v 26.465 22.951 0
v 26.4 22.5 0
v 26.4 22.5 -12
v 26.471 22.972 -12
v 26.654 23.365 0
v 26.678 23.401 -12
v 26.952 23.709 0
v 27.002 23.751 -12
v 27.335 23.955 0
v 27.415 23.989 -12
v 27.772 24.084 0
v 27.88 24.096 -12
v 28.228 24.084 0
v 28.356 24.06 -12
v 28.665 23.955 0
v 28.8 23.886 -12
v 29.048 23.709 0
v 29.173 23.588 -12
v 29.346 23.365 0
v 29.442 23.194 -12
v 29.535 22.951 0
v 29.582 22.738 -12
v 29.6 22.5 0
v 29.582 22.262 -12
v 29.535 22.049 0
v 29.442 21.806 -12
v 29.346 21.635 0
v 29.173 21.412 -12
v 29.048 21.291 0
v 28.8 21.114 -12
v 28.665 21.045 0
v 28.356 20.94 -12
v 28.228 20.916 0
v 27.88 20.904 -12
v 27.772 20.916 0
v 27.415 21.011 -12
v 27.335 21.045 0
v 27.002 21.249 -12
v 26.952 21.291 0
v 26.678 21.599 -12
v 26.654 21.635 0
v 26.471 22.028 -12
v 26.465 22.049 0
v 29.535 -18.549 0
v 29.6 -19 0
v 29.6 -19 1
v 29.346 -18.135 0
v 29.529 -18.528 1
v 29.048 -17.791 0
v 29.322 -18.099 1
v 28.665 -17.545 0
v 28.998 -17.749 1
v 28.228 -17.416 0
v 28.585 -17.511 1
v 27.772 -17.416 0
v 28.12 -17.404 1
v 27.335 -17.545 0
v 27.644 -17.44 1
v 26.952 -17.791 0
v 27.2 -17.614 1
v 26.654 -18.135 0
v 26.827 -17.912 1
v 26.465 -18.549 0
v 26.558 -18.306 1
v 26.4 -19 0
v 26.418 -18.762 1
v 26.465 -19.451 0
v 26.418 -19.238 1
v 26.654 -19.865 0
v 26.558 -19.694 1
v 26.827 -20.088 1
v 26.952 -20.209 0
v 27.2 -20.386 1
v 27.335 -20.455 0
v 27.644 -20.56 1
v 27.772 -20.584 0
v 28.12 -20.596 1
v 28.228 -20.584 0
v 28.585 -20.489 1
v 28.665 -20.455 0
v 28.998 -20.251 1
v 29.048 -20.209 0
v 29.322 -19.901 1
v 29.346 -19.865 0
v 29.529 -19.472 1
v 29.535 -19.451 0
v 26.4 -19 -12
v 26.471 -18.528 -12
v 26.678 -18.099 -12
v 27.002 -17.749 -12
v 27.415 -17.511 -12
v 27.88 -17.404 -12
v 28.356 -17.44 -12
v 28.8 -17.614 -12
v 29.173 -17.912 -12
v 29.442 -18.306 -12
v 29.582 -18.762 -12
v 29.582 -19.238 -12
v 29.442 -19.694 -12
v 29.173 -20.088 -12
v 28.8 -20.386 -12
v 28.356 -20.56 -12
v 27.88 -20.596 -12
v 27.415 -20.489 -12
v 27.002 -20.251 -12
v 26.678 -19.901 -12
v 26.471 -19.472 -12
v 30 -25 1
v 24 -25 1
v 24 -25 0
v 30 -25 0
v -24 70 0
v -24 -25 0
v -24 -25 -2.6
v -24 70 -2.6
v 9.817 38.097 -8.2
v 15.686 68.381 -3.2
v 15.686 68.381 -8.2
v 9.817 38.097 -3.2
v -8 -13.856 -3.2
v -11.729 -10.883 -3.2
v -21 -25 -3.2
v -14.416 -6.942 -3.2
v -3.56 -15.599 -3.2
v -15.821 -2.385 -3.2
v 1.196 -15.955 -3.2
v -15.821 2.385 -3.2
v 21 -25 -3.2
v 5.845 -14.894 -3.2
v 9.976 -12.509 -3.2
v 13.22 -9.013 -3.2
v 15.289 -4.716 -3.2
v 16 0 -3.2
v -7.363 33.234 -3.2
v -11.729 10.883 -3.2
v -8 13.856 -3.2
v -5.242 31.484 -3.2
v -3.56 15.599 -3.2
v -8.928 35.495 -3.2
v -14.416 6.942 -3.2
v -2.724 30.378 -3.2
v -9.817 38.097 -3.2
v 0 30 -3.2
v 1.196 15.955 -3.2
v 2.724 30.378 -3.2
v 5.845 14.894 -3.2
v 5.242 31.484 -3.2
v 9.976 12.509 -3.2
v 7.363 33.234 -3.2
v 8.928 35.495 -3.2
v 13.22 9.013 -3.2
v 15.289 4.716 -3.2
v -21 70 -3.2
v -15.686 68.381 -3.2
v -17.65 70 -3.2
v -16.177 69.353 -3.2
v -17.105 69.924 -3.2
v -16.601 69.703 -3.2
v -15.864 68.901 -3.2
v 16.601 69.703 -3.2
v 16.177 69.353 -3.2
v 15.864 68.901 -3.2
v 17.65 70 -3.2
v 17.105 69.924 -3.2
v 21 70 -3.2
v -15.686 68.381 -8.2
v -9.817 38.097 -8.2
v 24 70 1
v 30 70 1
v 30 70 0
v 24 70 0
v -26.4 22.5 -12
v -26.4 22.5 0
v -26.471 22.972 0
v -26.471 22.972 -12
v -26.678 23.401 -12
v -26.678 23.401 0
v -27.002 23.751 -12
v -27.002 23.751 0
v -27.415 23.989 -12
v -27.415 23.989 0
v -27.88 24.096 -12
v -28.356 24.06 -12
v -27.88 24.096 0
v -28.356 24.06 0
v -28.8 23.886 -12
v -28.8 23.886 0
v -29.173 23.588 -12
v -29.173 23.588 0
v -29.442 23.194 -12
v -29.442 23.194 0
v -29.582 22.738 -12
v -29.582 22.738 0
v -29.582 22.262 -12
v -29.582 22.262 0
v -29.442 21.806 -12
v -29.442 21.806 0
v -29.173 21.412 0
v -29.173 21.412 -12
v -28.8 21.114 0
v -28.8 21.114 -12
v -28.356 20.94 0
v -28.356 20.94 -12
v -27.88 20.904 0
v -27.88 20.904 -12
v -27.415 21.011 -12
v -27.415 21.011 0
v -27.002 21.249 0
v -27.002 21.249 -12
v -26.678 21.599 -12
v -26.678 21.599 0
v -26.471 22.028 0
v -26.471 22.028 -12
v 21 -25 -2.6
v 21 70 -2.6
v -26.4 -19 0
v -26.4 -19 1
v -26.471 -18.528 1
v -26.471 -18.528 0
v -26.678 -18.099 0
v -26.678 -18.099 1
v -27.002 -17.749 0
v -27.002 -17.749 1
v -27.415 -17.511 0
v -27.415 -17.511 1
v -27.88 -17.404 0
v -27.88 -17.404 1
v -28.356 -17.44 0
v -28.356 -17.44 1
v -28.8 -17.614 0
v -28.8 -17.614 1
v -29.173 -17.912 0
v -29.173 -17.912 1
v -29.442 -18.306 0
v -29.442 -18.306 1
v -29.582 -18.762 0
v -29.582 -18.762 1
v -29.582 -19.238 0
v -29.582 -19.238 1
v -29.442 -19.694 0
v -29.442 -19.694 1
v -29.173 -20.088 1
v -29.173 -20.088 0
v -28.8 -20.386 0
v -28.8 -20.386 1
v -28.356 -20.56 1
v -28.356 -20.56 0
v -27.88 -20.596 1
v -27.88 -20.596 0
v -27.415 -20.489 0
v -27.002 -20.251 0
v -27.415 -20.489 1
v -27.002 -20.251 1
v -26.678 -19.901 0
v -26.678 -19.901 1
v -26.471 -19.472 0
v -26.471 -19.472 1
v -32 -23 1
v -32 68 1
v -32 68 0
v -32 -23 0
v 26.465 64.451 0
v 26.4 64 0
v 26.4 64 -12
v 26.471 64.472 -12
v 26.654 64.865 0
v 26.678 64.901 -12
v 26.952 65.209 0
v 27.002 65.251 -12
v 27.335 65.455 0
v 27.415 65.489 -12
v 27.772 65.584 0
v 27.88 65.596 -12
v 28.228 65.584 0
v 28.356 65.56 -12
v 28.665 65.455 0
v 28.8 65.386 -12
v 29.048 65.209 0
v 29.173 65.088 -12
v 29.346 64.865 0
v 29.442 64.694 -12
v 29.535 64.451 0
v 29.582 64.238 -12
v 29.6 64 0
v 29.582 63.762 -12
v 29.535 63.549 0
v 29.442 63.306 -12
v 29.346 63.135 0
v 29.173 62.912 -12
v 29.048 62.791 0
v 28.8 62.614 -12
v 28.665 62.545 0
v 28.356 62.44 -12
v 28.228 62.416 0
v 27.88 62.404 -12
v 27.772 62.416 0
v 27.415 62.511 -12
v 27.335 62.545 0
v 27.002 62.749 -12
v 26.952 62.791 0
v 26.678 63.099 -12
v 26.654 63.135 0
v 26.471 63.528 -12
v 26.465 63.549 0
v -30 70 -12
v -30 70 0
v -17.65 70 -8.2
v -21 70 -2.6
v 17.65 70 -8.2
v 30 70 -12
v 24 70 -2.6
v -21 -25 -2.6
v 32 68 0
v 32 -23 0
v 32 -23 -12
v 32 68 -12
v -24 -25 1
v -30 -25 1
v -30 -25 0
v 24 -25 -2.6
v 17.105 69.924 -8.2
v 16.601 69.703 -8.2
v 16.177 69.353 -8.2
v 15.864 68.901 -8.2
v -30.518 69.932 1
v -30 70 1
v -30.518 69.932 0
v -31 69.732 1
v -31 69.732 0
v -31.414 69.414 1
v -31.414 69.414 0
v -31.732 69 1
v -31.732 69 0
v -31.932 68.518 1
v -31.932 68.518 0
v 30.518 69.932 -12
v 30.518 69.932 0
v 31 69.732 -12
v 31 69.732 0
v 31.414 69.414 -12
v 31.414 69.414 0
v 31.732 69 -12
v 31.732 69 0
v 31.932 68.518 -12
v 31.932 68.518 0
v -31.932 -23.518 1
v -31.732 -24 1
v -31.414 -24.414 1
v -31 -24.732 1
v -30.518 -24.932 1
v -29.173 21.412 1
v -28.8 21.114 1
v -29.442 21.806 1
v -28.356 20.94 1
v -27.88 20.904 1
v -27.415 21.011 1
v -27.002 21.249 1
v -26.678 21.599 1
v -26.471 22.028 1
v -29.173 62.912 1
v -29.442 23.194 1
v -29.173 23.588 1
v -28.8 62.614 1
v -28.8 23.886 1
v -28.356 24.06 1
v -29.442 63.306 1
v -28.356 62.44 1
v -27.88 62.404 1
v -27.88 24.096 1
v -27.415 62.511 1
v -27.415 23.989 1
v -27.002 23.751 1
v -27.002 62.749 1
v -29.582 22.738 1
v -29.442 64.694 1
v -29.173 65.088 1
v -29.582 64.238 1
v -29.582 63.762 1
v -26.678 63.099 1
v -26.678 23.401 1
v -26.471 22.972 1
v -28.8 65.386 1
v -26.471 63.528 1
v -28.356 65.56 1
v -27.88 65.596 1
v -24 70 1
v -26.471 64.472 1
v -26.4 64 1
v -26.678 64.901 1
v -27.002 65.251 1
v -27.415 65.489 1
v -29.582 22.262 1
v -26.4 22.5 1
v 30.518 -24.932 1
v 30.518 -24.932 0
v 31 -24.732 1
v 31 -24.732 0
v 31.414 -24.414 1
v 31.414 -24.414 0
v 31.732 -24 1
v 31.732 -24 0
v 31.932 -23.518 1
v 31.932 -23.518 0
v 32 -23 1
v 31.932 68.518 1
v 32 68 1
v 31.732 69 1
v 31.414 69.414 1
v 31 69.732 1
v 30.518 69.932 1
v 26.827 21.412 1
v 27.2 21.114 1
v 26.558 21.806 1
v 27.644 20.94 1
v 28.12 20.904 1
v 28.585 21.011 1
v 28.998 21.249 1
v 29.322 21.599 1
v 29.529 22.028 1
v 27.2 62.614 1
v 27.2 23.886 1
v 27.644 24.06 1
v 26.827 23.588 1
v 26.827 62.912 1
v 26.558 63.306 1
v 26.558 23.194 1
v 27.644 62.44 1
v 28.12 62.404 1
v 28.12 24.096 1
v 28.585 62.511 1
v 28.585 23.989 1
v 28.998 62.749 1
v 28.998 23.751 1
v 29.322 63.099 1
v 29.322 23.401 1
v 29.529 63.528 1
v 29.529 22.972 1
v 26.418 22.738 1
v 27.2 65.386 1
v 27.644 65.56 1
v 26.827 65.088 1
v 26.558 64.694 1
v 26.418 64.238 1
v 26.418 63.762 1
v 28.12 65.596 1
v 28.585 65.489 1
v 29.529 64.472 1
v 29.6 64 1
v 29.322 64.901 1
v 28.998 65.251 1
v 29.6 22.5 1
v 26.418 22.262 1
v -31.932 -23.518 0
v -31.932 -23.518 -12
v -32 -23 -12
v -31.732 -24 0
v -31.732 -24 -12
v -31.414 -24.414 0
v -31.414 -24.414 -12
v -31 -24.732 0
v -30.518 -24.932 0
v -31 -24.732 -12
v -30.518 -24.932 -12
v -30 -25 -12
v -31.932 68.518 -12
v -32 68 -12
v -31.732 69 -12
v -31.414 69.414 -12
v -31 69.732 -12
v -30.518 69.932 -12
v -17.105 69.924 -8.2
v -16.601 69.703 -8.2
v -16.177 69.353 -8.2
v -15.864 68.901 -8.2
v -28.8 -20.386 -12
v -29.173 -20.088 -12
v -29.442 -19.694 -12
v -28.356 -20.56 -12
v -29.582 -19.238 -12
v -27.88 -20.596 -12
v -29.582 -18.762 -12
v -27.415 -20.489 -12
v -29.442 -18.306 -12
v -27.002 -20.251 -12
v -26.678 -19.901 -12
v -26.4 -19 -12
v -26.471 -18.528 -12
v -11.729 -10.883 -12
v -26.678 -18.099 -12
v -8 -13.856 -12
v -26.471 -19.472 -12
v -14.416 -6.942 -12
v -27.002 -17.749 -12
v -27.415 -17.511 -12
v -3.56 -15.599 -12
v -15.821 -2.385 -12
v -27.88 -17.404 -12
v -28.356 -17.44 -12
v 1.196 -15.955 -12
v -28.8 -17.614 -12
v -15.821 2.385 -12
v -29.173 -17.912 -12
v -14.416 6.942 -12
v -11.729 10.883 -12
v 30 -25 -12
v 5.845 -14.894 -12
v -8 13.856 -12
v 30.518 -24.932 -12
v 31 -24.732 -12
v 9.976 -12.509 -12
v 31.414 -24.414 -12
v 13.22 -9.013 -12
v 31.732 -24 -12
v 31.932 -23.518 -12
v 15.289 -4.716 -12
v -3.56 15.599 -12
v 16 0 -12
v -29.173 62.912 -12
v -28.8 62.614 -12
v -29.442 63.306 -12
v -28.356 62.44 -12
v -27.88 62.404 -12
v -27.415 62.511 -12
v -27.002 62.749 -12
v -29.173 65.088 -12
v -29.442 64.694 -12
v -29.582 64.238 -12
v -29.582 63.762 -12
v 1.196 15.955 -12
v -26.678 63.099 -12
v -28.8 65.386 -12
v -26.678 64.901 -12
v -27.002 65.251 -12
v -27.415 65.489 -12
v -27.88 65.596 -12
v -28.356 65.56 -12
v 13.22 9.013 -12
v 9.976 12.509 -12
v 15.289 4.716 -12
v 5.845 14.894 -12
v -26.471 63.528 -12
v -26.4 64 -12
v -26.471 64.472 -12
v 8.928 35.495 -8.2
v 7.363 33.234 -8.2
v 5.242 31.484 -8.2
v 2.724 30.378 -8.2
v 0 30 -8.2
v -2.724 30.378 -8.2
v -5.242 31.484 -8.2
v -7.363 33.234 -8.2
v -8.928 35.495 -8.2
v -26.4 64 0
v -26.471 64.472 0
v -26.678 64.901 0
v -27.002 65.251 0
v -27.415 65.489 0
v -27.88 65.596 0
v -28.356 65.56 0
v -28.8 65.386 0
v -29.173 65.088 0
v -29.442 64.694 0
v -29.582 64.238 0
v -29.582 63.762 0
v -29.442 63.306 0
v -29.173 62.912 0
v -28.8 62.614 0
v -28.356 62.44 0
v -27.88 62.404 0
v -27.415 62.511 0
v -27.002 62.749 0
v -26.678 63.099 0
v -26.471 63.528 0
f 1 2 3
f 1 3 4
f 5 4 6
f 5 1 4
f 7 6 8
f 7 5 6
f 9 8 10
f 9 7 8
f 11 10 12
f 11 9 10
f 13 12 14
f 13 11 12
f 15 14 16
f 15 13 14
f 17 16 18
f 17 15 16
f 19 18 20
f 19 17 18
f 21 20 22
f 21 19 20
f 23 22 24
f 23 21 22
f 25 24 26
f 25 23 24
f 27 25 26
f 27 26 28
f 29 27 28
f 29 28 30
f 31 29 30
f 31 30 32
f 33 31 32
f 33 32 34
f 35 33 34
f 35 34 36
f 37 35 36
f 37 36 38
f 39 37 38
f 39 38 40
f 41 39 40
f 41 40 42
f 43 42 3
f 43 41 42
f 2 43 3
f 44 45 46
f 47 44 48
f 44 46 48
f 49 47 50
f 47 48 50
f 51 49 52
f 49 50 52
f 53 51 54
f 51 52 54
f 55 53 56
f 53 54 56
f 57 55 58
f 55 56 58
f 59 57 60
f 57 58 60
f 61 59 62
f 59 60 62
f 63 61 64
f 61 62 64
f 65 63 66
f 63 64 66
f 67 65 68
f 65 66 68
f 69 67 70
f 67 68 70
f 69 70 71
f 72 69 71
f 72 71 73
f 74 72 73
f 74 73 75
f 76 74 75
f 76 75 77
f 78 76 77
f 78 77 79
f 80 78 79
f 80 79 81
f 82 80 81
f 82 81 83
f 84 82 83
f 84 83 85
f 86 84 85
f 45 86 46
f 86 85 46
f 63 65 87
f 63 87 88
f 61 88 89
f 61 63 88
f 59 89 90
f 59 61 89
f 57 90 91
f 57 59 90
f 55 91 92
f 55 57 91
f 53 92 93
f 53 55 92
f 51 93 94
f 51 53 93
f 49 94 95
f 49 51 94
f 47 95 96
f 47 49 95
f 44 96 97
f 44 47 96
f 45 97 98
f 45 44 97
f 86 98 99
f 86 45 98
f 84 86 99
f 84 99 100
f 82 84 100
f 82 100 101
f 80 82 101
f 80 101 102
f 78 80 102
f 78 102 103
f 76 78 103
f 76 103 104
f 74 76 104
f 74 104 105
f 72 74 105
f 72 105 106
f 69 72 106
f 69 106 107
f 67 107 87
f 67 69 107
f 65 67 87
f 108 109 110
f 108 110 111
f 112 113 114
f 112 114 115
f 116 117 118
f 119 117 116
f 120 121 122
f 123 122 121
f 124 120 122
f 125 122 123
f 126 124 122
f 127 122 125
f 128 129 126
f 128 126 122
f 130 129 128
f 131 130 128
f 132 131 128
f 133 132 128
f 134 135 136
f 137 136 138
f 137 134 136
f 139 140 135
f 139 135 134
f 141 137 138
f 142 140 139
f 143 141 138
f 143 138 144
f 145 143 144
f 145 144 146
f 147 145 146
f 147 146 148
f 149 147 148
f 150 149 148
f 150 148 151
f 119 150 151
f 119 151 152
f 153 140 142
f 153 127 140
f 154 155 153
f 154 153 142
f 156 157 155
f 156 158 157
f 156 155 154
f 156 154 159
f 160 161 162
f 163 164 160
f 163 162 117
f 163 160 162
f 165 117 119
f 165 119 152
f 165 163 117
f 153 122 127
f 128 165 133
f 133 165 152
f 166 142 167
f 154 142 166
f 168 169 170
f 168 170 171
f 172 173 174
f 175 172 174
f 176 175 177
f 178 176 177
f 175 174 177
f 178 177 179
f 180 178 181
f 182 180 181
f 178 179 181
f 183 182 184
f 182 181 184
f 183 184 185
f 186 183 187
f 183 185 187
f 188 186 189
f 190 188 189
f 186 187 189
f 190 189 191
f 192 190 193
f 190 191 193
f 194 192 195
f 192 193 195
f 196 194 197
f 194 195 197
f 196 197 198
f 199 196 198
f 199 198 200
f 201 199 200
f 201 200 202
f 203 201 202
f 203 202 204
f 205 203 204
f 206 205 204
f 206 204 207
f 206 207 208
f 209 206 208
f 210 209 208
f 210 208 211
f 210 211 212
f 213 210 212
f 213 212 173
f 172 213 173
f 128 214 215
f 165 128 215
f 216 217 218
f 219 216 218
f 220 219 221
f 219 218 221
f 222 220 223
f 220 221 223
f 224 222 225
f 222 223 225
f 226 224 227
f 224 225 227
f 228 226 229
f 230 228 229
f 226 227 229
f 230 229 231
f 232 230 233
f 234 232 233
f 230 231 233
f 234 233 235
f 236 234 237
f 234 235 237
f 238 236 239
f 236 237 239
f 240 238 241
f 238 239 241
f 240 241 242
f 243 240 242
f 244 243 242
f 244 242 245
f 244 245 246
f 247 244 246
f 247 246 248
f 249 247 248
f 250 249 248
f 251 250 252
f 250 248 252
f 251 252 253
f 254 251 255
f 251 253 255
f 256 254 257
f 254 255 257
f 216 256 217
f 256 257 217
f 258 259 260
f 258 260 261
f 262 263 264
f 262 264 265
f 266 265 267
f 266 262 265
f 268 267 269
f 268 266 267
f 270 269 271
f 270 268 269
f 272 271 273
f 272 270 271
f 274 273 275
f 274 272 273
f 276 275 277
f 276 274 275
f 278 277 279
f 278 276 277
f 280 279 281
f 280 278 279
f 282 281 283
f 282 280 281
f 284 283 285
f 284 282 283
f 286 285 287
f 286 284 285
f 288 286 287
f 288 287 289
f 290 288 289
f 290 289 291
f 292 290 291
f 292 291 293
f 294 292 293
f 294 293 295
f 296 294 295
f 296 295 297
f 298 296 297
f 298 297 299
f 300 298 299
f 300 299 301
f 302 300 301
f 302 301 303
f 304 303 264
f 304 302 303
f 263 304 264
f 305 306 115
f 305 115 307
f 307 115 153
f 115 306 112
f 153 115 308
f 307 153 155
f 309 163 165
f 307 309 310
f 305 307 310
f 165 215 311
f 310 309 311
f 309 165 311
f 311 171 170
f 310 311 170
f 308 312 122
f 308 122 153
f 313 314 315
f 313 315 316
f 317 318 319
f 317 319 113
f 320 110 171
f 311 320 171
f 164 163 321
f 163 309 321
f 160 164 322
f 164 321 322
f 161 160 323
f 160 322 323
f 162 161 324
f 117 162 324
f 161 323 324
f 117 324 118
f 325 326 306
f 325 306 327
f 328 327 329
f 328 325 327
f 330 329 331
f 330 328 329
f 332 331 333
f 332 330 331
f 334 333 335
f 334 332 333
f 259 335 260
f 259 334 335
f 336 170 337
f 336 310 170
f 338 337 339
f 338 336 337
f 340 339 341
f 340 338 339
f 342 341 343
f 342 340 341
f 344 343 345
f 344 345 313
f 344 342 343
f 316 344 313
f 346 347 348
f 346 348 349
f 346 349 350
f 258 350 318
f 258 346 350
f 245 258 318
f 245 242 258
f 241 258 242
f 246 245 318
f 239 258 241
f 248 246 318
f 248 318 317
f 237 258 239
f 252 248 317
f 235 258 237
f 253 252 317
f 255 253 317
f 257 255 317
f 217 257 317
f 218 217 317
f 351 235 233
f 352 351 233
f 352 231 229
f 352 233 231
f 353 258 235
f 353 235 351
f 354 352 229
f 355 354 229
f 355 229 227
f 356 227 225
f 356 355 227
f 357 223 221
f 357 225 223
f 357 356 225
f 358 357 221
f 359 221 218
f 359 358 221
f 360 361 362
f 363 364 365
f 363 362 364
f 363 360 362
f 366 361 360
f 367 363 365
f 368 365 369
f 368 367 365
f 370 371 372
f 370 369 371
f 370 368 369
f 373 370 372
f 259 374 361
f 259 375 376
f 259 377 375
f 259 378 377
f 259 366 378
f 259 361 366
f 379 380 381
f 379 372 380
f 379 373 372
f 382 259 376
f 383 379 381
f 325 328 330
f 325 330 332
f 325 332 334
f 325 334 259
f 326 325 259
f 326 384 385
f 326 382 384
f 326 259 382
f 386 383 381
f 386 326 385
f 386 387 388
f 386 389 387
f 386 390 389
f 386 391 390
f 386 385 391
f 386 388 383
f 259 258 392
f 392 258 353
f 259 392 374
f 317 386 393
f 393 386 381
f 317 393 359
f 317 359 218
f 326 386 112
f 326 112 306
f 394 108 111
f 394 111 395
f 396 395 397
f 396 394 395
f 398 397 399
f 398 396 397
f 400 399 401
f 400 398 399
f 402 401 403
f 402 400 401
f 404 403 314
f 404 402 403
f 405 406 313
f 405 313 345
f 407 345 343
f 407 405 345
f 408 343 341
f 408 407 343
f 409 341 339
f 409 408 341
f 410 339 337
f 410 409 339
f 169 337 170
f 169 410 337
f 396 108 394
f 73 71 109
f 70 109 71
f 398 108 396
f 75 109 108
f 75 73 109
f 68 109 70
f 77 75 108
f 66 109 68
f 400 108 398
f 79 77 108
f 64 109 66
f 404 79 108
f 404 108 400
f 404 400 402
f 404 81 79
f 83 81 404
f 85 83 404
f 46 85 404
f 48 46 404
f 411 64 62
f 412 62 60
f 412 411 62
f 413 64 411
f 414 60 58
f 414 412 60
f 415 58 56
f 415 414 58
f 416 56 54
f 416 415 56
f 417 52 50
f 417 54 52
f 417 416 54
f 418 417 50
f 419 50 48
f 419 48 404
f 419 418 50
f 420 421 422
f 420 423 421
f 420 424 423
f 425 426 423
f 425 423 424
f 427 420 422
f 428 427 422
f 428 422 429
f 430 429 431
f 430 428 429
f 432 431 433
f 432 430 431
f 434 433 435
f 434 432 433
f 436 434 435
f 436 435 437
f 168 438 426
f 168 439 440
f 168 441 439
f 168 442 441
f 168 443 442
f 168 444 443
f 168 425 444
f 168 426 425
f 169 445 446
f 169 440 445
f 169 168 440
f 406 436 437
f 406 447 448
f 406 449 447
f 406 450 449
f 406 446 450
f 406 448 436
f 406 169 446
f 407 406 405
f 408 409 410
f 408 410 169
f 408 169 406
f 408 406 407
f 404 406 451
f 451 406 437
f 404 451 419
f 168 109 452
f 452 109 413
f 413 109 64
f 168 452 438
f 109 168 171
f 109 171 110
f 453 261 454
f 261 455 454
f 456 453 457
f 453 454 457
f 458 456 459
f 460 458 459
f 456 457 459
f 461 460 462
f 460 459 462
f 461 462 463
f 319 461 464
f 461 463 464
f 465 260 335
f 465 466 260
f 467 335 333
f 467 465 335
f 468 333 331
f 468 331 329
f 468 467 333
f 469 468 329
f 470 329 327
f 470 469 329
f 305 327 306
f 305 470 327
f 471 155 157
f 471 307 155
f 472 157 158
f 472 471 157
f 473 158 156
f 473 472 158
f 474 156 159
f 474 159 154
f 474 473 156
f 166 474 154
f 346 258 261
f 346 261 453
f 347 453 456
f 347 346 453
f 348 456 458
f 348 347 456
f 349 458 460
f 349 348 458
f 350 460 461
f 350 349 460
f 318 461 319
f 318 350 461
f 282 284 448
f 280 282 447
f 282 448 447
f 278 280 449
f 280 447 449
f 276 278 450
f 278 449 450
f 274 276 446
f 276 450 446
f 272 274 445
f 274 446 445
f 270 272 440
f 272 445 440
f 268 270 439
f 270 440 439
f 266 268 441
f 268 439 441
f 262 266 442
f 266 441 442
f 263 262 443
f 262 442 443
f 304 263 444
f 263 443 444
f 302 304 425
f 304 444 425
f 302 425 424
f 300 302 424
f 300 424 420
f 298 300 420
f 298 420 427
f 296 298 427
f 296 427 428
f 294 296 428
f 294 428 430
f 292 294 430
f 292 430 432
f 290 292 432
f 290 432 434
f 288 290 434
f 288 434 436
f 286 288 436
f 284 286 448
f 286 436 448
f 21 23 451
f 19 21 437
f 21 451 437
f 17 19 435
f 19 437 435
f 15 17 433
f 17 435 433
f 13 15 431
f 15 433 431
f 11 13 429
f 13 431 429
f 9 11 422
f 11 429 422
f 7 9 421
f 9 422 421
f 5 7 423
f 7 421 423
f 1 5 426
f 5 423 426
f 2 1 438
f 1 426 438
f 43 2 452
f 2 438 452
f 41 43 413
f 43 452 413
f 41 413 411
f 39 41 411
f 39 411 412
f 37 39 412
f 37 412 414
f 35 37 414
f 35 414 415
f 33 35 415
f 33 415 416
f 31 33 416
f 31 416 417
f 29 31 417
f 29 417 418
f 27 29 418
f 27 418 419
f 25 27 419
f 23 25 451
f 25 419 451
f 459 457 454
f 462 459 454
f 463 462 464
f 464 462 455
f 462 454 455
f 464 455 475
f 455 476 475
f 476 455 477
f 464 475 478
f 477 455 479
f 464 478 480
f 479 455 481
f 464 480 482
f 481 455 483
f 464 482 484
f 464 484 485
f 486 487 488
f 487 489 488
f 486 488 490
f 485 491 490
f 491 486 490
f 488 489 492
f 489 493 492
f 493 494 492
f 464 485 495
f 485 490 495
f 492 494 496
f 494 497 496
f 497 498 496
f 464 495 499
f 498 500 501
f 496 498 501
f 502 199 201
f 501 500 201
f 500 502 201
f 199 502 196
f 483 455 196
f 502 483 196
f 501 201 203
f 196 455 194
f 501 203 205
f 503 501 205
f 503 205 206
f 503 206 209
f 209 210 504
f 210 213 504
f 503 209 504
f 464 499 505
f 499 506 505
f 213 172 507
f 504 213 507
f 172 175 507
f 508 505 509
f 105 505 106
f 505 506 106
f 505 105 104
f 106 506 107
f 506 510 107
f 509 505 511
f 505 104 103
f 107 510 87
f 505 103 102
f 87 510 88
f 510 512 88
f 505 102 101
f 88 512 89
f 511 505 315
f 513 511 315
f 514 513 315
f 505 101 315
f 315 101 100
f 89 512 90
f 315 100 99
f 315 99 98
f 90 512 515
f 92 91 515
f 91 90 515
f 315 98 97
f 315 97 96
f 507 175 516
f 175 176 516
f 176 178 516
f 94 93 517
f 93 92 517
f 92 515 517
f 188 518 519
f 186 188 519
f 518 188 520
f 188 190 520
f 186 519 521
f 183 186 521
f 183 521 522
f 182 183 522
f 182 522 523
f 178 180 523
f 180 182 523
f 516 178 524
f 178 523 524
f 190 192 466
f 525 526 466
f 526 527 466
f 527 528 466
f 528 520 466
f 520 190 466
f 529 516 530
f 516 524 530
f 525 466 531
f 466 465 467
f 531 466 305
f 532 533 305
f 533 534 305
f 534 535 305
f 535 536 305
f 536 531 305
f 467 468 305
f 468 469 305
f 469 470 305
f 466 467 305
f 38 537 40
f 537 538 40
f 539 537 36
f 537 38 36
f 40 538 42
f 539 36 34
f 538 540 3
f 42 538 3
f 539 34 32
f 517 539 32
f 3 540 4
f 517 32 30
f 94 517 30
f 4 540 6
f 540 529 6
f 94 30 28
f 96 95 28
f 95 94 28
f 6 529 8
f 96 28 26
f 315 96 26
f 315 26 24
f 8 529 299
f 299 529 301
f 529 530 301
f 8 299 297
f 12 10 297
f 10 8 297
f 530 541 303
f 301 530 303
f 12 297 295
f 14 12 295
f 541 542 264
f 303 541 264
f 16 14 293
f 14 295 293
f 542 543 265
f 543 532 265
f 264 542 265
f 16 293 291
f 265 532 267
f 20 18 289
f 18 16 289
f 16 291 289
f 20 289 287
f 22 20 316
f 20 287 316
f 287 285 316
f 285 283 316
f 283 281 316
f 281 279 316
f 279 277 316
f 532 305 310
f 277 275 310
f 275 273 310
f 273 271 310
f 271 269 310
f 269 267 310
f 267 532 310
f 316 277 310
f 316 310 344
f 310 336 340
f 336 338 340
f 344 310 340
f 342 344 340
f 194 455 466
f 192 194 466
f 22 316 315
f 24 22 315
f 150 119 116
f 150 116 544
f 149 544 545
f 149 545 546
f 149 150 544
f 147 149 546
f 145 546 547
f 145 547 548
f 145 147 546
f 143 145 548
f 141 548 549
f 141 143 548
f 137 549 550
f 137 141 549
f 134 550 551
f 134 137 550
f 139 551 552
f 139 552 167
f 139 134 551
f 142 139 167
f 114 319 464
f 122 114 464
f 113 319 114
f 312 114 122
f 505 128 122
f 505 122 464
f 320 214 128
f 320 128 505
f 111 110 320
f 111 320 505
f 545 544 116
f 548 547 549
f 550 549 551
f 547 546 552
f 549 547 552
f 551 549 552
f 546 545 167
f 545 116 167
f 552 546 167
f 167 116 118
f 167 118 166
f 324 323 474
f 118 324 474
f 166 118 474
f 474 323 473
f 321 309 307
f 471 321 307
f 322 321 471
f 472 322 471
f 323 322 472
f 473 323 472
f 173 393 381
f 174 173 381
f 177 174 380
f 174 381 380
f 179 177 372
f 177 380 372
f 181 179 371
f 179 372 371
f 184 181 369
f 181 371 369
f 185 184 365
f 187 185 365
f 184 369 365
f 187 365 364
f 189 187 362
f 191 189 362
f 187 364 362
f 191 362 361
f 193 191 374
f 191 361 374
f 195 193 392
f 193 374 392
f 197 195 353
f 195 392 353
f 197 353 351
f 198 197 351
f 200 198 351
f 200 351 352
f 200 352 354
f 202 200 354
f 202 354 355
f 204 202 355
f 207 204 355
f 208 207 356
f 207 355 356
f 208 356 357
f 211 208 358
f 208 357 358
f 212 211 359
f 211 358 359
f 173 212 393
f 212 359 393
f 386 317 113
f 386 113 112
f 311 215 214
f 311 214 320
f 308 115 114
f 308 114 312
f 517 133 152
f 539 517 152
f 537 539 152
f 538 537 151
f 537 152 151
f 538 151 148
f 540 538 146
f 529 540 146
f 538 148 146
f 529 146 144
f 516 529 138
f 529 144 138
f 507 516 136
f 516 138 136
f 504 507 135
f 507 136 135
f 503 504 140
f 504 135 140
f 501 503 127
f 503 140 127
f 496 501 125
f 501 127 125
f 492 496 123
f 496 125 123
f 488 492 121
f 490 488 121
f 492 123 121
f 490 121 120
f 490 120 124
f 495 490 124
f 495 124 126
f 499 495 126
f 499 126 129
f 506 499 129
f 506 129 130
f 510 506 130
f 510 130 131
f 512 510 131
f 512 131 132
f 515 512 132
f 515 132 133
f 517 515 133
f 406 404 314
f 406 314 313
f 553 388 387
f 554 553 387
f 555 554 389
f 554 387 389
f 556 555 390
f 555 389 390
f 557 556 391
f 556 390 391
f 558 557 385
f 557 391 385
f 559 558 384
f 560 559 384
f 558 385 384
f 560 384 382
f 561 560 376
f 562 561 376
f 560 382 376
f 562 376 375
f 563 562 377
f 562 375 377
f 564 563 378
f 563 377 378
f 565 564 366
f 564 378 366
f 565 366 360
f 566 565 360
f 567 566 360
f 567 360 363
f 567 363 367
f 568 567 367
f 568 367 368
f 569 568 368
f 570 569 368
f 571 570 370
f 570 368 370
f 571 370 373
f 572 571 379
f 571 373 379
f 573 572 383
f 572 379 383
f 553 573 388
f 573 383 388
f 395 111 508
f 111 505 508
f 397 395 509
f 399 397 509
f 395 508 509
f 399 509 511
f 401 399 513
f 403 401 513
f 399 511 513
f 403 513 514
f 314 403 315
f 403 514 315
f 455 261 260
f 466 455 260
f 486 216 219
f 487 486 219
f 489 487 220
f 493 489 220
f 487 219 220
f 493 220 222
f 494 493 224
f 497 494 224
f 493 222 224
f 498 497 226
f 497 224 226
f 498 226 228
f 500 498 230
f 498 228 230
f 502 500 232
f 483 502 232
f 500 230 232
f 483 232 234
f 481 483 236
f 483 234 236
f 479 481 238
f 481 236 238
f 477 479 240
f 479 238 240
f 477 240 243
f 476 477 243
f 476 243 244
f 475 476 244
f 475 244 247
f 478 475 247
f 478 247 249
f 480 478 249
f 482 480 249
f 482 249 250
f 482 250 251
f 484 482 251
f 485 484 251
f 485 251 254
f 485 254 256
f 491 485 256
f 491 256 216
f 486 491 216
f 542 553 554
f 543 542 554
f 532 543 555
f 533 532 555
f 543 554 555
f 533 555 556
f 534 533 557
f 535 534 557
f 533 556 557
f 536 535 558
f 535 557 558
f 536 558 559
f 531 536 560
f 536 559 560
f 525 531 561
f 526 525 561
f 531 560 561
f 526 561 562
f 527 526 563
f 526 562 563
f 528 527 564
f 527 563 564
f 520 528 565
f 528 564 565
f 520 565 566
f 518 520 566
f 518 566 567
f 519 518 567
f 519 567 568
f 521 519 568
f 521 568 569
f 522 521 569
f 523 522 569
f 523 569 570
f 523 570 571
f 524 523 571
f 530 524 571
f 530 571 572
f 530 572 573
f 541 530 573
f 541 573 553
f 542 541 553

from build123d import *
from build123d.topology import SkipClean

# Parameters (mm, degrees)
ESQUISSE1_W             = 64
ESQUISSE1_H             = 95
ESQUISSE1_R             = 16
BOSS_EXTRU_1_DEPTH      = 12
ESQUISSE2_W             = 48
ESQUISSE2_H             = 95
ENL_V_MAT_EXTRU_1_DEPTH = 2.6
ESQUISSE3_W             = 42
ESQUISSE3_H             = 95
ENL_V_MAT_EXTRU_2_DEPTH = 0.6
ESQUISSE4_R             = 1.6
ENL_V_MAT_EXTRU_4_DEPTH = 78.897368377
ENL_V_MAT_EXTRU_5_DEPTH = 5
CONG_1_R                = 2
BOSS_EXTRU_2_START      = 1
ESQUISSE6_R             = 1.6
BOSS_EXTRU_2_DEPTH      = 1


with BuildPart() as part:
    # Esquisse1 → Boss.-Extru.1 (new body)
    with BuildSketch(Plane.XY):
        with Locations((0, 22.5)):
            Rectangle(ESQUISSE1_W, ESQUISSE1_H)
        Circle(ESQUISSE1_R, mode=Mode.SUBTRACT)
    extrude(amount=-BOSS_EXTRU_1_DEPTH)

    # Esquisse2 → Enlèv. mat.-Extru.1 (cut)
    with BuildSketch(Plane.XY):
        with Locations((0, 22.5)):
            Rectangle(ESQUISSE2_W, ESQUISSE2_H)
    extrude(amount=-ENL_V_MAT_EXTRU_1_DEPTH, mode=Mode.SUBTRACT)

    # Esquisse3 → Enlèv. mat.-Extru.2 (cut)
    with BuildSketch(Plane.XY.offset(-2.6)):
        with Locations((0, 22.5)):
            Rectangle(ESQUISSE3_W, ESQUISSE3_H)
    extrude(amount=-ENL_V_MAT_EXTRU_2_DEPTH, mode=Mode.SUBTRACT)

    # Esquisse4 → Enlèv. mat.-Extru.4 (cut, through all)
    with BuildSketch(Plane.XY):
        with Locations((-28, -19)):
            Circle(ESQUISSE4_R)
        with Locations((-28, 22.5)):
            Circle(ESQUISSE4_R)
        with Locations((-28, 64)):
            Circle(ESQUISSE4_R)
    enl_v_mat_extru_4 = extrude(amount=-ENL_V_MAT_EXTRU_4_DEPTH, mode=Mode.SUBTRACT)

    # Symétrie1: Enlèv. mat.-Extru.4 across plane
    add(enl_v_mat_extru_4.mirror(Plane(origin=(0, 0, 0), x_dir=(0, 0, 1), z_dir=(1, 0, 0))), mode=Mode.SUBTRACT)

    # Esquisse5 → Enlèv. mat.-Extru.5 (cut)
    with BuildSketch(Plane.XY.offset(-3.2)):
        with BuildLine():
            Line((16, 70), (9.817340904, 38.097418184))
            ThreePointArc((9.817340904, 38.097418184), (0, 30), (-9.817340904, 38.097418184))
            Line((-9.817340904, 38.097418184), (-16, 70))
            Line((-16, 70), (16, 70))
        make_face()
    extrude(amount=-ENL_V_MAT_EXTRU_5_DEPTH, mode=Mode.SUBTRACT)

    # Congé1
    cong_1_edges = [part.edges().sort_by_distance(p)[0] for p in [
        (-32, 70, -6),
        (32, 70, -6),
        (32, -25, -6),
        (-32, -25, -6),
        (-16, 70, -5.7),
        (16, 70, -5.7),
    ]]
    fillet(cong_1_edges, radius=CONG_1_R)

    # Esquisse6 → Boss.-Extru.2 (add)
    # profile 1 of 2: a face of its own
    with SkipClean():  # the faces are left unmerged after this step: merging them gives an invalid solid
        with BuildSketch(Plane.XY.offset(BOSS_EXTRU_2_START)):
            with BuildLine():
                Line((-32, 68), (-32, -23))
                ThreePointArc((-32, -23), (-31.414213562, -24.414213562), (-30, -25))
                Line((-30, -25), (-24, -25))
                Line((-24, -25), (-24, 70))
                Line((-24, 70), (-30, 70))
                ThreePointArc((-30, 70), (-31.414213562, 69.414213562), (-32, 68))
            make_face()
            with Locations((-28, 64)):
                Circle(ESQUISSE6_R, mode=Mode.SUBTRACT)
            with Locations((-28, 22.5)):
                Circle(ESQUISSE6_R, mode=Mode.SUBTRACT)
            with Locations((-28, -19)):
                Circle(ESQUISSE6_R, mode=Mode.SUBTRACT)
        # profile 2 of 2: a face of its own
        with BuildSketch(Plane.XY.offset(BOSS_EXTRU_2_START)):
            with BuildLine():
                Line((32, -23), (32, 68))
                ThreePointArc((32, 68), (31.414213562, 69.414213562), (30, 70))
                Line((30, 70), (24, 70))
                Line((24, 70), (24, -25))
                Line((24, -25), (30, -25))
                ThreePointArc((30, -25), (31.414213562, -24.414213562), (32, -23))
            make_face()
            with Locations((28, -19)):
                Circle(ESQUISSE6_R, mode=Mode.SUBTRACT)
            with Locations((28, 22.5)):
                Circle(ESQUISSE6_R, mode=Mode.SUBTRACT)
            with Locations((28, 64)):
                Circle(ESQUISSE6_R, mode=Mode.SUBTRACT)
        extrude(amount=-BOSS_EXTRU_2_DEPTH)


solid = part.part
